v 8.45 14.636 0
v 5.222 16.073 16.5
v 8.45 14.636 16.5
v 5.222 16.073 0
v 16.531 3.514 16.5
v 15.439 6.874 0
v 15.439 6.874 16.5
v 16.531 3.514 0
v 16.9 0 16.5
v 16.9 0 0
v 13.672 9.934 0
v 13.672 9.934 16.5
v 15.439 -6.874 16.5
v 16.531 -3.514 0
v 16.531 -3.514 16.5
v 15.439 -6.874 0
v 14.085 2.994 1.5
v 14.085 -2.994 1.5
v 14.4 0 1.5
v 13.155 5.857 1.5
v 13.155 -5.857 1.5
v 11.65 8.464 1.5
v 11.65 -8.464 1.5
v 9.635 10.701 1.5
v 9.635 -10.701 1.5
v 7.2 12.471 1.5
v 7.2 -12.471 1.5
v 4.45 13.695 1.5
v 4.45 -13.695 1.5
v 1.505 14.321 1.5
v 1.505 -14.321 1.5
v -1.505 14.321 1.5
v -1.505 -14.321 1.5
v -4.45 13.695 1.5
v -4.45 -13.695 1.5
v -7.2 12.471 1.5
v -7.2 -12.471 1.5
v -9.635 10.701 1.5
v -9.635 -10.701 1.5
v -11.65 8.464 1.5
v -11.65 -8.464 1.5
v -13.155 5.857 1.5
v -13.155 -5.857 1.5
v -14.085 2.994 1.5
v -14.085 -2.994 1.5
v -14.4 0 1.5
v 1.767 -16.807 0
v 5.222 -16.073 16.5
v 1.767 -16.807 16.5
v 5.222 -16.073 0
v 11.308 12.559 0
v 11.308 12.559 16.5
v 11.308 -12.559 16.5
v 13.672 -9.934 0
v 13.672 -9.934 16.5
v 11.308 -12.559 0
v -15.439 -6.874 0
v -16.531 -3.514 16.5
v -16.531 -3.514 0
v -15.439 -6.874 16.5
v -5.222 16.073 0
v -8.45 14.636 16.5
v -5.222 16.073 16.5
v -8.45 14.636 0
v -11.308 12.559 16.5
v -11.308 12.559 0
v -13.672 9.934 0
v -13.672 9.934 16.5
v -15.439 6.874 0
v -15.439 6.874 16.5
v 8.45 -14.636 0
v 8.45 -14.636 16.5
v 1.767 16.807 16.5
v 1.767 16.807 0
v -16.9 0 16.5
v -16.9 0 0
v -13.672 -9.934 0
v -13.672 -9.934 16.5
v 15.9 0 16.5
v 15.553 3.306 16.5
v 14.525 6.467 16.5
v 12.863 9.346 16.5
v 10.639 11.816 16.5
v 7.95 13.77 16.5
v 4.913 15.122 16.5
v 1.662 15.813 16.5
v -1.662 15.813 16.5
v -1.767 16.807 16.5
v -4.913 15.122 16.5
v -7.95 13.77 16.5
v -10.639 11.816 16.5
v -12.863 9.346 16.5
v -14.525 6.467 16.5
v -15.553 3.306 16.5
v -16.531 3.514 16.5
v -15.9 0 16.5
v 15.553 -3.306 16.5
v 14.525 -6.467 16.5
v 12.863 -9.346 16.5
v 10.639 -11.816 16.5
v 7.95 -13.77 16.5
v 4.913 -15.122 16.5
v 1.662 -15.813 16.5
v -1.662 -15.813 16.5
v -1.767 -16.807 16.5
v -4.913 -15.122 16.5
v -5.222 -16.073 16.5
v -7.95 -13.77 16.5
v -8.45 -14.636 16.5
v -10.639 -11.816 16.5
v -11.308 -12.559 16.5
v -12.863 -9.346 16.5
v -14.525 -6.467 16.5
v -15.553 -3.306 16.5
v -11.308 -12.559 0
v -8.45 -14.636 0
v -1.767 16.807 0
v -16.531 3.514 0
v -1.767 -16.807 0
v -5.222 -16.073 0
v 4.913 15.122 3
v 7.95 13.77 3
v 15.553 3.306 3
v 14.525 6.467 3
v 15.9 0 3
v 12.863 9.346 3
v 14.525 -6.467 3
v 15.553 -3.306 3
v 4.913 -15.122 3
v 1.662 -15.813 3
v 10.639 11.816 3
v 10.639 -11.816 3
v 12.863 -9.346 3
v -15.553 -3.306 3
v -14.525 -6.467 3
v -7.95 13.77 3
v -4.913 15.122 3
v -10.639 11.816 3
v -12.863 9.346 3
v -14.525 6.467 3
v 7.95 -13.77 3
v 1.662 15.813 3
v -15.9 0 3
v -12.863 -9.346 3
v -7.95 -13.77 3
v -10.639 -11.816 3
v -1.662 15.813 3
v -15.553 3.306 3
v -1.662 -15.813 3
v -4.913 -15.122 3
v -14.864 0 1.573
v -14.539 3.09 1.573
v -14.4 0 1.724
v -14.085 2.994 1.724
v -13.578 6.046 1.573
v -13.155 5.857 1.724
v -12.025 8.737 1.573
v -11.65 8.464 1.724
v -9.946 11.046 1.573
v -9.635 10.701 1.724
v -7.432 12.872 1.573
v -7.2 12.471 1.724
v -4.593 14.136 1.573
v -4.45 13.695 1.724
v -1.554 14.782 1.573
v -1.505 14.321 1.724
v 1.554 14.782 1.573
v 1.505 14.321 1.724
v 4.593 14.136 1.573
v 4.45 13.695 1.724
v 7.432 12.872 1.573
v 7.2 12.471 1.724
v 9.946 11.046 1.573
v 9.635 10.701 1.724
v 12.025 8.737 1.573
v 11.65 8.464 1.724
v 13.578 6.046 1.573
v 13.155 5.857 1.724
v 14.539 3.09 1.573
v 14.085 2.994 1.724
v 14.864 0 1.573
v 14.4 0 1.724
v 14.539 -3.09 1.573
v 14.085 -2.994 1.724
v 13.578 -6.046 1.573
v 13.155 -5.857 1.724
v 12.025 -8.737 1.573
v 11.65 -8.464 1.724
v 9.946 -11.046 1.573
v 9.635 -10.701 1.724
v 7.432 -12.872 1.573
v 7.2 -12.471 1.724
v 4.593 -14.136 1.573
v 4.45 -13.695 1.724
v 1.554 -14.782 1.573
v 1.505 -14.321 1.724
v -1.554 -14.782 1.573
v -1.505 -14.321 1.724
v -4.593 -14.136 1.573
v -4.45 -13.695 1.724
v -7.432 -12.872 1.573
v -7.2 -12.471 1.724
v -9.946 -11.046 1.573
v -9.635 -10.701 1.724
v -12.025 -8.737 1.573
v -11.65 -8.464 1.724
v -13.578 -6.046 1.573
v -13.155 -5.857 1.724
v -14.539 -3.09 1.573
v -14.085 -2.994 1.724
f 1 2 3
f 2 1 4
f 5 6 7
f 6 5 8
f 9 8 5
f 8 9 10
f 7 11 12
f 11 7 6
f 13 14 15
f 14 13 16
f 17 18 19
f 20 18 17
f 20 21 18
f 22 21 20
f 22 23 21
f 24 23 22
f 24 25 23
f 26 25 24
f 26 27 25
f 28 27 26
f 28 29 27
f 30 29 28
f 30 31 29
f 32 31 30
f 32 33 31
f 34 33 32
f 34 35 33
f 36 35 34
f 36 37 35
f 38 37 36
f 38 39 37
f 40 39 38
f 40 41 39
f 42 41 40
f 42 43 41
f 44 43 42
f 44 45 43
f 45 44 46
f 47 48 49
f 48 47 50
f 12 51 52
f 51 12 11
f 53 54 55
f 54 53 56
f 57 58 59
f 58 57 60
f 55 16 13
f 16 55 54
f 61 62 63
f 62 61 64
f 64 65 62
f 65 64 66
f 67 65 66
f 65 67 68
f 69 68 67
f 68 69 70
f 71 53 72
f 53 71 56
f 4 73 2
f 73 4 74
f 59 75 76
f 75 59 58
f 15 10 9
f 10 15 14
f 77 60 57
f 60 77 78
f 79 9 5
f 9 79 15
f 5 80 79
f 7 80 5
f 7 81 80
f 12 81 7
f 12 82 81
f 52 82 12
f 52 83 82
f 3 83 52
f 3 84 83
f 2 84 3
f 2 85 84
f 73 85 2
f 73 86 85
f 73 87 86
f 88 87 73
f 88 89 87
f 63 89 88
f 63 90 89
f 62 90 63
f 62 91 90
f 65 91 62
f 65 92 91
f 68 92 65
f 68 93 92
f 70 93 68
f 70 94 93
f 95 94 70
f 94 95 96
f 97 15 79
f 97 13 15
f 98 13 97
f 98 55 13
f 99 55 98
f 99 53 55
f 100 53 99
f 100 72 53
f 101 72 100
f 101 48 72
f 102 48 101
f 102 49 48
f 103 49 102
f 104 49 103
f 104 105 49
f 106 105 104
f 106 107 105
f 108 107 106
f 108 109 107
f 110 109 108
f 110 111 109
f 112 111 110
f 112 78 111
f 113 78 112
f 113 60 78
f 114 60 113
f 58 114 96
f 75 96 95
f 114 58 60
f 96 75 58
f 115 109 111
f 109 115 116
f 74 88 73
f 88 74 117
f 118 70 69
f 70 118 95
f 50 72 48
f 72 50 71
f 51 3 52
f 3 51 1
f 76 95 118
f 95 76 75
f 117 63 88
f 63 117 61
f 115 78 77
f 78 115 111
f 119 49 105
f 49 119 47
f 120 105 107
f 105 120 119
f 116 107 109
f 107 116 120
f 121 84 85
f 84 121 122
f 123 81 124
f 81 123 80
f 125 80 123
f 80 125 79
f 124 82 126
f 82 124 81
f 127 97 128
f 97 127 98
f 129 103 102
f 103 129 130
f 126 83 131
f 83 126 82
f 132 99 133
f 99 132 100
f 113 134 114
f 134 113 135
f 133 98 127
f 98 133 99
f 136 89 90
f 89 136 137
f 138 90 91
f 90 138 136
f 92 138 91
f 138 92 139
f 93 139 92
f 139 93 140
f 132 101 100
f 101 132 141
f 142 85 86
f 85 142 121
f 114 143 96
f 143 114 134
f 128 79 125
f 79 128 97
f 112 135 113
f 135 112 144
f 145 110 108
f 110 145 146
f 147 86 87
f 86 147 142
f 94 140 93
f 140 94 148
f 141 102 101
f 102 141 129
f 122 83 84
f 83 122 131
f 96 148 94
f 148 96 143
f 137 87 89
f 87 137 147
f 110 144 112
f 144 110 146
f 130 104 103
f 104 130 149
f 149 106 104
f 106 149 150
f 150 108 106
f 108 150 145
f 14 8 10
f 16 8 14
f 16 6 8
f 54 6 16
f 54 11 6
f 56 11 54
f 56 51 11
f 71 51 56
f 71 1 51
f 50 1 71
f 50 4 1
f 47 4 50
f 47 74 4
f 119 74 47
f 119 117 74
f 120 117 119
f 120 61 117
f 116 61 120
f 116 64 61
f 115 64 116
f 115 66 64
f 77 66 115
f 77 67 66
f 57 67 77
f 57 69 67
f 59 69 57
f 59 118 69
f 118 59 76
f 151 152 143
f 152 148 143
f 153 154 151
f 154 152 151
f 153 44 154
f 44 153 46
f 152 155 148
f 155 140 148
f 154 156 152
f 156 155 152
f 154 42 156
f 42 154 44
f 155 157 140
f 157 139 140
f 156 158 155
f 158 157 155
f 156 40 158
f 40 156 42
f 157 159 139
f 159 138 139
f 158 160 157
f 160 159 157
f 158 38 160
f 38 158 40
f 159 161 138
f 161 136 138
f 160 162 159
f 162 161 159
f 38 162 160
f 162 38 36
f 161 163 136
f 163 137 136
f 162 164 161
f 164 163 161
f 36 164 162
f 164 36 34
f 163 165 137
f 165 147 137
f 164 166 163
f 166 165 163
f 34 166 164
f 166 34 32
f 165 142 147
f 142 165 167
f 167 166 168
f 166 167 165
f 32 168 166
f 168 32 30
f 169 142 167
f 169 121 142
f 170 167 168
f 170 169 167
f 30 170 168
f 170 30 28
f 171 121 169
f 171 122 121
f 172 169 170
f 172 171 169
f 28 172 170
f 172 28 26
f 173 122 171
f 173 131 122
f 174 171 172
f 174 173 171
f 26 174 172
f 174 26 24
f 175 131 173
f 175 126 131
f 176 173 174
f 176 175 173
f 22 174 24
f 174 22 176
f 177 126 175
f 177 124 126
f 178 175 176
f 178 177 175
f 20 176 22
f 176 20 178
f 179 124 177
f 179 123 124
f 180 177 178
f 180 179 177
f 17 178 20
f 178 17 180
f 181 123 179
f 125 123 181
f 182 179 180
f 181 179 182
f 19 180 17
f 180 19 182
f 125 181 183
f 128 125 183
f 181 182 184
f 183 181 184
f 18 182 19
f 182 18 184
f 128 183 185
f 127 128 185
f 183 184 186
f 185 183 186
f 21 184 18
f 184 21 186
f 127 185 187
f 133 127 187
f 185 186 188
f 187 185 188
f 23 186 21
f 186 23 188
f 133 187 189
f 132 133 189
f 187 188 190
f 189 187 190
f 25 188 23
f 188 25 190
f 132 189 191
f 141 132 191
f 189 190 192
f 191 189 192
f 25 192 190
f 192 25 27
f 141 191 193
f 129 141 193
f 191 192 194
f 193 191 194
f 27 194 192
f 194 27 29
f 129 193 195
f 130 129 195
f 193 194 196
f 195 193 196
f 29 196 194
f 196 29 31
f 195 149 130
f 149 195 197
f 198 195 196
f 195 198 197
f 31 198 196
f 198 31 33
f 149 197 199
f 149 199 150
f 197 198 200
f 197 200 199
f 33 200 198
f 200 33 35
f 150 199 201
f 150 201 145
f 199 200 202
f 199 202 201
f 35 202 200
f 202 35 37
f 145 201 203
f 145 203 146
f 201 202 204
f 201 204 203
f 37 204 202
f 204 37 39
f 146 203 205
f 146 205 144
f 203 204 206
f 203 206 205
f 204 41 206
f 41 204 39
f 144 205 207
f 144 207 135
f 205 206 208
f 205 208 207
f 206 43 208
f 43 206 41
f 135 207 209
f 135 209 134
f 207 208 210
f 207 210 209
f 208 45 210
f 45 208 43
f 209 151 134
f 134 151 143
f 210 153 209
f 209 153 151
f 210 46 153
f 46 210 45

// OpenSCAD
// file: ../../modules/lid.scad
module lid(
  hole_diameter,
  edge_height,
  inner_border = 0,
  base_height = 1,
  edge_thickness = 1
) {
  inner_radius = hole_diameter / 2;
  outer_radius = inner_radius + edge_thickness;

  cylinder(h = base_height, r = outer_radius);

  translate([ 0, 0, base_height ]) difference() {
    cylinder(h = edge_height, r = outer_radius);
    cylinder(h = edge_height + .01, r = hole_diameter / 2);
  }

  rotate_extrude() translate([inner_radius - inner_border, base_height]) difference() {
    square([inner_border, inner_border]);
    translate([0, inner_border]) circle(r = inner_border);
  }
}
// main file
use <../../modules/lid.scad>

lid(
  hole_diameter = 31.8,
  edge_height = 15,
  inner_border = 1.5,
  base_height = 1.5,
  edge_thickness = 1
);
